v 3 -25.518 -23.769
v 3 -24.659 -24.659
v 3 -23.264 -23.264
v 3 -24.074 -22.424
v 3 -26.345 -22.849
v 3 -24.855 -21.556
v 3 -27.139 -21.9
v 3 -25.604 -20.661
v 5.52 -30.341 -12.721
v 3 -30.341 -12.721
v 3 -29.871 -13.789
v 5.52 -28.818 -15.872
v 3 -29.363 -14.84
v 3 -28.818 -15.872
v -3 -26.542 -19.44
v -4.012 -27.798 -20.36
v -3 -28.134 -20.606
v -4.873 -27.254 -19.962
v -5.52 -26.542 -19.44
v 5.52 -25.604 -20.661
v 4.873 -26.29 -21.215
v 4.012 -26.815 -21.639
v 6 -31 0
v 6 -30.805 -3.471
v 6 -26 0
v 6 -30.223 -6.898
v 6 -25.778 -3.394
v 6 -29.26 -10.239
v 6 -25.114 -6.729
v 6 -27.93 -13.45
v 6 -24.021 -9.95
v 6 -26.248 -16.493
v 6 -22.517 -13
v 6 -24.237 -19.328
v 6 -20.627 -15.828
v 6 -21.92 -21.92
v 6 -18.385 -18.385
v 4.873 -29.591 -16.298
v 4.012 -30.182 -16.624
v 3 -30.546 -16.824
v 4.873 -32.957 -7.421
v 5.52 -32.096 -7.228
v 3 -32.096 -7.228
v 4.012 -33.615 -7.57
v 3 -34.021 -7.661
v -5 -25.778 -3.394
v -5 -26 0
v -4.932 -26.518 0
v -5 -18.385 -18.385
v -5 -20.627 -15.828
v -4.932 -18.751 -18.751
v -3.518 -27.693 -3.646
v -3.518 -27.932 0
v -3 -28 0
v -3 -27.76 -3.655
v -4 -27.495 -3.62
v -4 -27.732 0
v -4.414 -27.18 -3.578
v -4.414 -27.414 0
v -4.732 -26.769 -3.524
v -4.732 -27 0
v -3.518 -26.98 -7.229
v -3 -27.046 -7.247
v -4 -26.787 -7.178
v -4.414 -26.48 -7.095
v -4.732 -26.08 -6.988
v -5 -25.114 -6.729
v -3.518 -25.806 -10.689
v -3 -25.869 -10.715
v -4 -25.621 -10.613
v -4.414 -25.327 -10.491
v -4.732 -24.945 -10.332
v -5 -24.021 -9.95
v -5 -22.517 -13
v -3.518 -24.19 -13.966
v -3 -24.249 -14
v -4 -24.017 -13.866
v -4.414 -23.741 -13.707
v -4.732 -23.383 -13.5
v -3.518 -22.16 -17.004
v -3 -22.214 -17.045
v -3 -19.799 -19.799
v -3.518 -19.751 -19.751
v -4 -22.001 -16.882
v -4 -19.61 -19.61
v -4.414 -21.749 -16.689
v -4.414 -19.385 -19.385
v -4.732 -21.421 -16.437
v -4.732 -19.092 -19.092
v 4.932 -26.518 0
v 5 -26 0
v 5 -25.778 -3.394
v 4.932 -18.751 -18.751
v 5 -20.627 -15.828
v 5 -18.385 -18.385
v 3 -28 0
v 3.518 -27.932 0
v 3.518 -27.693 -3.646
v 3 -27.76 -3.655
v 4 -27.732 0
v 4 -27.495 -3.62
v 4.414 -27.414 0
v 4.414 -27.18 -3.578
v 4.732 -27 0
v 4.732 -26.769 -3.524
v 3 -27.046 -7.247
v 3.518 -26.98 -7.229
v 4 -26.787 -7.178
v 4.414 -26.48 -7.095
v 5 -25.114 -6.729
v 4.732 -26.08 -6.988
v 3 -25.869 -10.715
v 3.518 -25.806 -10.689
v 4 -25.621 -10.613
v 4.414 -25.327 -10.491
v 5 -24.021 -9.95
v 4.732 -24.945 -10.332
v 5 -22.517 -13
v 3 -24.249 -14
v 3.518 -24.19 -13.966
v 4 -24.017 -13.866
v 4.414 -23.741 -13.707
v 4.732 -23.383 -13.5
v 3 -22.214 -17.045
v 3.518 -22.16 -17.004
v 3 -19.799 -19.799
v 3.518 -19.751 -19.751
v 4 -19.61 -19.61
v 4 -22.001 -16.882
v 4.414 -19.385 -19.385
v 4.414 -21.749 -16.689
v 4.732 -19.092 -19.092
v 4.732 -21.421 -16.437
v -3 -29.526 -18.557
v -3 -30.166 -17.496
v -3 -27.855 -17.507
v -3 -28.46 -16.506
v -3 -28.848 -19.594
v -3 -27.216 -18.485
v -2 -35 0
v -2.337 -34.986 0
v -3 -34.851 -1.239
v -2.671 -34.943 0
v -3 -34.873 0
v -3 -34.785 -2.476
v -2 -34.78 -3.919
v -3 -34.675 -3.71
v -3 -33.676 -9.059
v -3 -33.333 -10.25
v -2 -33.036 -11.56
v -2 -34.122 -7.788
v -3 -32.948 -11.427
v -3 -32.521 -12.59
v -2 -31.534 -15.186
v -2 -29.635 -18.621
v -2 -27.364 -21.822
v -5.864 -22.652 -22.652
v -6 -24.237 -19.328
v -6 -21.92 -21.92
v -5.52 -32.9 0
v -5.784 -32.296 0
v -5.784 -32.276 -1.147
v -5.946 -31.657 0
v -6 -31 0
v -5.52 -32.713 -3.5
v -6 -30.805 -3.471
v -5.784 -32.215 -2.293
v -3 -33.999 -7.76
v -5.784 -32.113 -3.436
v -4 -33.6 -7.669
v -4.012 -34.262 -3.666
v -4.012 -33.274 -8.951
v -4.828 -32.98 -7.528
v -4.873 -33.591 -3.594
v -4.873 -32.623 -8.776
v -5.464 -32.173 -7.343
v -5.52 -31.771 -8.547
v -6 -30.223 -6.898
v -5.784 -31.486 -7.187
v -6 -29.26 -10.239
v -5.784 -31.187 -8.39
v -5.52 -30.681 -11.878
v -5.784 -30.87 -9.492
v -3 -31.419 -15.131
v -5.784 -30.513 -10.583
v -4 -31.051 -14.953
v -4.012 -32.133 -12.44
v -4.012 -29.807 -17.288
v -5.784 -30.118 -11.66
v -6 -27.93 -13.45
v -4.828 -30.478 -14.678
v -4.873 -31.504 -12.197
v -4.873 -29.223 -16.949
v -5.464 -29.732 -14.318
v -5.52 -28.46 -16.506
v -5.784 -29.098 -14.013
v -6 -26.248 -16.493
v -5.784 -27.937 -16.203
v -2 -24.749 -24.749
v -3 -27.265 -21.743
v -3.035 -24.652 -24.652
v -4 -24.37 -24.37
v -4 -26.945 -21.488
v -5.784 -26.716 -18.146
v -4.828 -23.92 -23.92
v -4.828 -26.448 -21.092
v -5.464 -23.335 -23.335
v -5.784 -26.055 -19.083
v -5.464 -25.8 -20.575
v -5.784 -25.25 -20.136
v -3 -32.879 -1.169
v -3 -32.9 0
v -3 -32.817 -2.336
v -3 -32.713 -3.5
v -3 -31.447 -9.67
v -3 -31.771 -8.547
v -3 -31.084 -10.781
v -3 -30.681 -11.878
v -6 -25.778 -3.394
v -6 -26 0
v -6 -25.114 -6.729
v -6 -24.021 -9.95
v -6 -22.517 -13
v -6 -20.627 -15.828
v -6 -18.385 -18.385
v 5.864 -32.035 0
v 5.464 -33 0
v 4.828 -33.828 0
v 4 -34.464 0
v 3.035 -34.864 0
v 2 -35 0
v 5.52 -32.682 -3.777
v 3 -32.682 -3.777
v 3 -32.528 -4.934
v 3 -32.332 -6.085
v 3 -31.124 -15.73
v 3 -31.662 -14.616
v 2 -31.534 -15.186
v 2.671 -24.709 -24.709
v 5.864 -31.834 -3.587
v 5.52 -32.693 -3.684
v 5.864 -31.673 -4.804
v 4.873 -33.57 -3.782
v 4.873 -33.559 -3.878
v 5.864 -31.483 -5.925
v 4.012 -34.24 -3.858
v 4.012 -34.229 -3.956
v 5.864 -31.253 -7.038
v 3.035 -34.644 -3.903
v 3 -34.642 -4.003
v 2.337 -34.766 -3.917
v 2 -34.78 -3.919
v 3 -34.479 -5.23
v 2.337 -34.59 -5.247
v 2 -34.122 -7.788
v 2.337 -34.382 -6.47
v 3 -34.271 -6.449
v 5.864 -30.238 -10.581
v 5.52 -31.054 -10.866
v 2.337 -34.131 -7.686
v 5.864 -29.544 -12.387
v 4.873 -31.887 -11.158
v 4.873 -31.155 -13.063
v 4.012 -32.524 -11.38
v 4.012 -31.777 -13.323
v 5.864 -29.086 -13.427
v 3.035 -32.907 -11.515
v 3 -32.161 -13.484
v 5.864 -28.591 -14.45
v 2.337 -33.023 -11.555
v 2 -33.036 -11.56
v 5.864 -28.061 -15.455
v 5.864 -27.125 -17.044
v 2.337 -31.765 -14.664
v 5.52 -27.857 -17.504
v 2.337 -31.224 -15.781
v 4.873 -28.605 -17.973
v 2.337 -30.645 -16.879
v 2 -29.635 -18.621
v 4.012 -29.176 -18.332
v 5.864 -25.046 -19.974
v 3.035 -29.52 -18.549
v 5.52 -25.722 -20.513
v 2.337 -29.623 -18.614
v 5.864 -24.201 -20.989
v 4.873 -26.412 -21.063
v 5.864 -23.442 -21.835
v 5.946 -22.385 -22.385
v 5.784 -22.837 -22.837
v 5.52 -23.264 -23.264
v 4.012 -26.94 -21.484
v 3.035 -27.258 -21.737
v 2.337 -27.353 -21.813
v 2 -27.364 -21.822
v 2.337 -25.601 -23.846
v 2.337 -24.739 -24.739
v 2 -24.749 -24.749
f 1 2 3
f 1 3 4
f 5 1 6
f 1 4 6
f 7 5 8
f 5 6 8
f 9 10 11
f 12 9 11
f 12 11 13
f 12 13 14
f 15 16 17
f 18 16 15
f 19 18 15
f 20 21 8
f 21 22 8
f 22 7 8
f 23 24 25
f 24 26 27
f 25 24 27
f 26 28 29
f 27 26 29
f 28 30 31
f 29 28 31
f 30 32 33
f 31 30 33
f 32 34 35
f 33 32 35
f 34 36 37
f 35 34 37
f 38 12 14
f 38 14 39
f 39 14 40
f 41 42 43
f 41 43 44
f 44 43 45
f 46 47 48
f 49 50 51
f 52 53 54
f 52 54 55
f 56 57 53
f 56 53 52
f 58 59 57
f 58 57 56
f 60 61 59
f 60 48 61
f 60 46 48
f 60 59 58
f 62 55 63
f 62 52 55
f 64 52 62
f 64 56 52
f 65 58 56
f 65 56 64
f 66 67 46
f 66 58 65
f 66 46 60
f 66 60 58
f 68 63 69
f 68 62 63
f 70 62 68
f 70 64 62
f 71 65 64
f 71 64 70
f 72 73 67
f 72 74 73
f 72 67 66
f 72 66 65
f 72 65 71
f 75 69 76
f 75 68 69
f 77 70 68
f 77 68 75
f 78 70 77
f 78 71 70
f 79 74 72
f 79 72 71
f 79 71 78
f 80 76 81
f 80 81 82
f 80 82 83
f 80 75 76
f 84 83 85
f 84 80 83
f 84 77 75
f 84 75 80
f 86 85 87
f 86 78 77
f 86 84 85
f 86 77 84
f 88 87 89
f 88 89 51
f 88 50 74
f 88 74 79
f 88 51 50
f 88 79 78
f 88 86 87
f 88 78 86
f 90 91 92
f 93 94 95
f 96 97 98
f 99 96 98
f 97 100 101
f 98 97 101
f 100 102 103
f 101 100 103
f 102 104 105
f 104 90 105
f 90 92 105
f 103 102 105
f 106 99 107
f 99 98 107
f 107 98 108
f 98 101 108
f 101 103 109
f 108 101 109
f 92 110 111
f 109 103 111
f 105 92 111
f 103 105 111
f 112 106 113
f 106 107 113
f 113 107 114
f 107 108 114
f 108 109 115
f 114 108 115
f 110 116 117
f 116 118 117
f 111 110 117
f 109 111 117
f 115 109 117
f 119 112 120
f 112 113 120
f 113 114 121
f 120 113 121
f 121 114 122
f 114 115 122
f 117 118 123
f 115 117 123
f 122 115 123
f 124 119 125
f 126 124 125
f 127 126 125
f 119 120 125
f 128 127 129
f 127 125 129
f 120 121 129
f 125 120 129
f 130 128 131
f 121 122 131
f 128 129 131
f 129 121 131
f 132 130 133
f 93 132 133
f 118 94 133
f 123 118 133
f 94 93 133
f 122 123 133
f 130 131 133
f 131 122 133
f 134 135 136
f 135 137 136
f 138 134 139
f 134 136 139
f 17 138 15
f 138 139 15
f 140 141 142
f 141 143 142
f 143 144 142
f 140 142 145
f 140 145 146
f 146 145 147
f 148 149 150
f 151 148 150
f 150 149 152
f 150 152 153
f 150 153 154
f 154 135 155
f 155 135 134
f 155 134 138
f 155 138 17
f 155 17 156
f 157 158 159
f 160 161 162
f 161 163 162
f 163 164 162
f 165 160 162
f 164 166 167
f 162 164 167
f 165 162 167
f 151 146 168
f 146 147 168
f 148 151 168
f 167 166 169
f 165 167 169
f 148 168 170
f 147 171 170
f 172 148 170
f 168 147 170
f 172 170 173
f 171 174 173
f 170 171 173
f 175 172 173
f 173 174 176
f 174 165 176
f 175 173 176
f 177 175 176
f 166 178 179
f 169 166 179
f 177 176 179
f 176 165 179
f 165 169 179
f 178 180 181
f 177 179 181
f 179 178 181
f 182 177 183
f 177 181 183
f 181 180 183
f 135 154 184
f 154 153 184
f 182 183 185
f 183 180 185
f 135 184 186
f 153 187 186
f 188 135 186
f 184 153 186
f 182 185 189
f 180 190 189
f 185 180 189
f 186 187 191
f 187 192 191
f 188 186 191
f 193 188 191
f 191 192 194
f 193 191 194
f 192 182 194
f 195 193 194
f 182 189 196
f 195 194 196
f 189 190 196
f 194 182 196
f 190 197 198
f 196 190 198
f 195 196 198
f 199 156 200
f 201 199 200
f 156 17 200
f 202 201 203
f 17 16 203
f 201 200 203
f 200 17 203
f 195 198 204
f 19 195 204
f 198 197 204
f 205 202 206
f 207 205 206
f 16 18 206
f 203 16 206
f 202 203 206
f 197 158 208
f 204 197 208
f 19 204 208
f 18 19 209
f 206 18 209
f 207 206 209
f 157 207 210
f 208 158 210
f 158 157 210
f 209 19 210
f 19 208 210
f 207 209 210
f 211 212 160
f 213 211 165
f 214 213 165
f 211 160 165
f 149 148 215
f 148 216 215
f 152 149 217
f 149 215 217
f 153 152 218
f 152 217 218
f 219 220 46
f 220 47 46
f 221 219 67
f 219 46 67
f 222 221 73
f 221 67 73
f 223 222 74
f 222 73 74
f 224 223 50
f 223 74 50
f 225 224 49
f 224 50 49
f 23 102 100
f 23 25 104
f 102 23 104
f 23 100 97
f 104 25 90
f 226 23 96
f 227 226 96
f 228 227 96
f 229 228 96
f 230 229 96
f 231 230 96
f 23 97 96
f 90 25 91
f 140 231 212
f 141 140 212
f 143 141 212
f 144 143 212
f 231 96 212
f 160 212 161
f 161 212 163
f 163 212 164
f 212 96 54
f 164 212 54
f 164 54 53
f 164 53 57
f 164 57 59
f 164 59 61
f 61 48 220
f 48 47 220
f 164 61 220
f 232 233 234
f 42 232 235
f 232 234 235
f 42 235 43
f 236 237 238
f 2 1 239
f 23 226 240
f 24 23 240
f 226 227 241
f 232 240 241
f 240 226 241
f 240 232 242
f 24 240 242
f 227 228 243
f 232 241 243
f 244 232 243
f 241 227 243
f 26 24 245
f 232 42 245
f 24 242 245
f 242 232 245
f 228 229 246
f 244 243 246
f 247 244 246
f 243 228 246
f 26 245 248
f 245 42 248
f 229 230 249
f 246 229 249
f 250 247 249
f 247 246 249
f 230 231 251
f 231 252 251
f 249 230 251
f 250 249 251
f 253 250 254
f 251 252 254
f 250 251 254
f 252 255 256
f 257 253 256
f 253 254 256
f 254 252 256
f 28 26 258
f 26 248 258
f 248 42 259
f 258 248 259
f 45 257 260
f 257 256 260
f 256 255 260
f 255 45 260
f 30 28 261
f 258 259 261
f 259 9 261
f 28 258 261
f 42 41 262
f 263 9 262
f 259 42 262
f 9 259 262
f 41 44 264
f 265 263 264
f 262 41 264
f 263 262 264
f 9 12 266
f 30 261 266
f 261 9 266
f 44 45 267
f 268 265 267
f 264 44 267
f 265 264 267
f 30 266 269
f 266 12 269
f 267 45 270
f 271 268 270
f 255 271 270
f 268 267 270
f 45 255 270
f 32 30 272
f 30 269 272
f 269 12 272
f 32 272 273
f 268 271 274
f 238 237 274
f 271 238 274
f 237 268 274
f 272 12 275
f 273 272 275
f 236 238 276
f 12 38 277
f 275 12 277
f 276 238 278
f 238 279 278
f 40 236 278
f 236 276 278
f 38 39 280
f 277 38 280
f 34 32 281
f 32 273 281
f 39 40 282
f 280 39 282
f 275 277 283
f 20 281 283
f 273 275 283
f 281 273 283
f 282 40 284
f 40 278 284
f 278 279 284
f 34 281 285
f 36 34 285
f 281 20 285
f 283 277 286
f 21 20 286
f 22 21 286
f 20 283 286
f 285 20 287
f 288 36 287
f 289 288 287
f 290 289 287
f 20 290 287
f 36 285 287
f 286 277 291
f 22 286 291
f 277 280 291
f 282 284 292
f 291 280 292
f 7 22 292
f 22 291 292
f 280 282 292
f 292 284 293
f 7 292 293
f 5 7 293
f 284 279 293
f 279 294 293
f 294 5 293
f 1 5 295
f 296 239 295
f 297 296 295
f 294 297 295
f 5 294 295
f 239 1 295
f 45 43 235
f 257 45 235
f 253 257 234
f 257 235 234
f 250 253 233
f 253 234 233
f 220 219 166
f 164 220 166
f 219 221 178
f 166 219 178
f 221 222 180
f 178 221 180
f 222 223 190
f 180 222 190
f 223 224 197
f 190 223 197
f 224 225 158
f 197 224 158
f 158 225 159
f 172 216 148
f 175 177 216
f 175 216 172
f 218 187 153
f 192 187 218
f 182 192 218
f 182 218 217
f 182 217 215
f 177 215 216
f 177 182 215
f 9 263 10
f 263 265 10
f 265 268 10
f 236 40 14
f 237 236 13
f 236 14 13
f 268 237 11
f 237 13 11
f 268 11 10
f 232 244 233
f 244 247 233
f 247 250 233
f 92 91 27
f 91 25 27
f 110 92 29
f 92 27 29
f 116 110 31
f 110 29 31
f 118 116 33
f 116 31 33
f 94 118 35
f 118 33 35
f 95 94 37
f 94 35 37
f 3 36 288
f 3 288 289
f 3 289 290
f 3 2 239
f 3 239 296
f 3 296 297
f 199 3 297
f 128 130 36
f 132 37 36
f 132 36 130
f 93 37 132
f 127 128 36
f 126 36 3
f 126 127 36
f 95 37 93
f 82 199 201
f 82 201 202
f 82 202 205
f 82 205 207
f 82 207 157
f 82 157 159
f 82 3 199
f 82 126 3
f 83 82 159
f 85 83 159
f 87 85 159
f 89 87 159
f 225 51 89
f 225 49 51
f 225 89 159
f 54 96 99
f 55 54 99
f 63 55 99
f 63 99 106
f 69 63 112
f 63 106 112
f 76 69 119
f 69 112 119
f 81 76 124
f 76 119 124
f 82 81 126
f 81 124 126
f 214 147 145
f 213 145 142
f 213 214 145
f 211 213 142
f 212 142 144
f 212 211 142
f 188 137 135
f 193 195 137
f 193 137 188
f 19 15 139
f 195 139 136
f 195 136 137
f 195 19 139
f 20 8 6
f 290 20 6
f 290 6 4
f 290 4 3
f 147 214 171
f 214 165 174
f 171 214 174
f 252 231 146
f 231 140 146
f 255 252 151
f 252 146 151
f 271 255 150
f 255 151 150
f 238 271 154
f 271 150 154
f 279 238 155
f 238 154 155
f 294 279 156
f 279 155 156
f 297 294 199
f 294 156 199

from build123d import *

# Parameters (mm, degrees)
REVOLVE1_ANGLE     = 45
CUT_EXTRUDE1_START = -3
CUT_EXTRUDE1_DEPTH = 3
CUT_EXTRUDE2_DEPTH = 3
FILLET1_R          = 2


with BuildPart() as part:
    # Sketch1 → Revolve1 (revolve)
    with BuildSketch(Plane.XY):
        with BuildLine():
            Line((-5, -28), (5, -28))
            Line((5, -28), (5, -26))
            Line((5, -26), (6, -26))
            Line((6, -26), (6, -31))
            ThreePointArc((6, -31), (4.828427125, -33.828427125), (2, -35))
            Line((2, -35), (-2, -35))
            ThreePointArc((-2, -35), (-4.828427125, -33.828427125), (-6, -31))
            Line((-6, -31), (-6, -26))
            Line((-6, -26), (-5, -26))
            Line((-5, -26), (-5, -28))
        make_face()
    revolve(axis=Axis((0.352941176, 0, 0), (1, 0, 0)), revolution_arc=REVOLVE1_ANGLE)

    # Sketch2 → Cut-Extrude1 (cut)
    with BuildSketch(Plane(origin=(6, 0, 0), x_dir=(0, 0, -1), z_dir=(1, 0, 0)).offset(CUT_EXTRUDE1_START)):
        with BuildLine():
            Line((21.979575266, -27.237809588), (20.66080075, -25.603541012))
            ThreePointArc((20.66080075, -25.603541012), (21.993442367, -24.468316101), (23.263813101, -23.263813101))
            Line((23.263813101, -23.263813101), (24.748737342, -24.748737342))
            ThreePointArc((24.748737342, -24.748737342), (23.397279114, -26.030123512), (21.979575266, -27.237809588))
        make_face()
        with BuildLine():
            Line((15.87243062, -28.817979565), (16.88556449, -30.657425069))
            ThreePointArc((16.88556449, -30.657425069), (15.230946014, -31.512192617), (13.533203573, -32.277738475))
            Line((13.533203573, -32.277738475), (12.721211358, -30.341074166))
            ThreePointArc((12.721211358, -30.341074166), (14.317089253, -29.62146106), (15.87243062, -28.817979565))
        make_face()
        with BuildLine():
            Line((7.227552694, -32.09630013), (7.688885845, -34.145000139))
            ThreePointArc((7.688885845, -34.145000139), (5.861777513, -34.505645399), (4.018072504, -34.768593491))
            Line((4.018072504, -34.768593491), (3.776988154, -32.682477882))
            ThreePointArc((3.776988154, -32.682477882), (5.510070862, -32.435306675), (7.227552694, -32.09630013))
        make_face()
    extrude(amount=CUT_EXTRUDE1_DEPTH, mode=Mode.SUBTRACT)

    # Sketch3 → Cut-Extrude2 (cut)
    with BuildSketch(Plane.ZY.offset(6)):
        with BuildLine():
            Line((0, -35), (0, -32.9))
            ThreePointArc((0, -32.9), (-1.752488008, -32.853291856), (-3.5, -32.713300048))
            Line((-3.5, -32.713300048), (-3.723404255, -34.801383029))
            ThreePointArc((-3.723404255, -34.801383029), (-1.864348945, -34.950310485), (0, -35))
        make_face()
        with BuildLine():
            Line((-12.636083101, -32.639384245), (-11.877918115, -30.68102119))
            ThreePointArc((-11.877918115, -30.68102119), (-10.226765616, -31.270165734), (-8.54657523, -31.770521743))
            Line((-8.54657523, -31.770521743), (-9.092101309, -33.798427386))
            ThreePointArc((-9.092101309, -33.798427386), (-10.879537889, -33.26613376), (-12.636083101, -32.639384245))
        make_face()
        with BuildLine():
            Line((-20.681152153, -28.236323161), (-19.440283023, -26.542143771))
            ThreePointArc((-19.440283023, -26.542143771), (-17.998860282, -27.539989625), (-16.506331561, -28.45963841))
            Line((-16.506331561, -28.45963841), (-17.559927193, -30.276211074))
            ThreePointArc((-17.559927193, -30.276211074), (-19.147723704, -29.297861303), (-20.681152153, -28.236323161))
        make_face()
    extrude(amount=-CUT_EXTRUDE2_DEPTH, mode=Mode.SUBTRACT)

    # Fillet1
    fillet1_edges = [part.edges().sort_by_distance(p)[0] for p in [
        (5, -25.86862691, -10.715136106),
        (-5, -25.86862691, -10.715136106),
    ]]
    fillet(fillet1_edges, radius=FILLET1_R - 0.0001)  # a hair under: the kernel refuses the full size


solid = part.part
